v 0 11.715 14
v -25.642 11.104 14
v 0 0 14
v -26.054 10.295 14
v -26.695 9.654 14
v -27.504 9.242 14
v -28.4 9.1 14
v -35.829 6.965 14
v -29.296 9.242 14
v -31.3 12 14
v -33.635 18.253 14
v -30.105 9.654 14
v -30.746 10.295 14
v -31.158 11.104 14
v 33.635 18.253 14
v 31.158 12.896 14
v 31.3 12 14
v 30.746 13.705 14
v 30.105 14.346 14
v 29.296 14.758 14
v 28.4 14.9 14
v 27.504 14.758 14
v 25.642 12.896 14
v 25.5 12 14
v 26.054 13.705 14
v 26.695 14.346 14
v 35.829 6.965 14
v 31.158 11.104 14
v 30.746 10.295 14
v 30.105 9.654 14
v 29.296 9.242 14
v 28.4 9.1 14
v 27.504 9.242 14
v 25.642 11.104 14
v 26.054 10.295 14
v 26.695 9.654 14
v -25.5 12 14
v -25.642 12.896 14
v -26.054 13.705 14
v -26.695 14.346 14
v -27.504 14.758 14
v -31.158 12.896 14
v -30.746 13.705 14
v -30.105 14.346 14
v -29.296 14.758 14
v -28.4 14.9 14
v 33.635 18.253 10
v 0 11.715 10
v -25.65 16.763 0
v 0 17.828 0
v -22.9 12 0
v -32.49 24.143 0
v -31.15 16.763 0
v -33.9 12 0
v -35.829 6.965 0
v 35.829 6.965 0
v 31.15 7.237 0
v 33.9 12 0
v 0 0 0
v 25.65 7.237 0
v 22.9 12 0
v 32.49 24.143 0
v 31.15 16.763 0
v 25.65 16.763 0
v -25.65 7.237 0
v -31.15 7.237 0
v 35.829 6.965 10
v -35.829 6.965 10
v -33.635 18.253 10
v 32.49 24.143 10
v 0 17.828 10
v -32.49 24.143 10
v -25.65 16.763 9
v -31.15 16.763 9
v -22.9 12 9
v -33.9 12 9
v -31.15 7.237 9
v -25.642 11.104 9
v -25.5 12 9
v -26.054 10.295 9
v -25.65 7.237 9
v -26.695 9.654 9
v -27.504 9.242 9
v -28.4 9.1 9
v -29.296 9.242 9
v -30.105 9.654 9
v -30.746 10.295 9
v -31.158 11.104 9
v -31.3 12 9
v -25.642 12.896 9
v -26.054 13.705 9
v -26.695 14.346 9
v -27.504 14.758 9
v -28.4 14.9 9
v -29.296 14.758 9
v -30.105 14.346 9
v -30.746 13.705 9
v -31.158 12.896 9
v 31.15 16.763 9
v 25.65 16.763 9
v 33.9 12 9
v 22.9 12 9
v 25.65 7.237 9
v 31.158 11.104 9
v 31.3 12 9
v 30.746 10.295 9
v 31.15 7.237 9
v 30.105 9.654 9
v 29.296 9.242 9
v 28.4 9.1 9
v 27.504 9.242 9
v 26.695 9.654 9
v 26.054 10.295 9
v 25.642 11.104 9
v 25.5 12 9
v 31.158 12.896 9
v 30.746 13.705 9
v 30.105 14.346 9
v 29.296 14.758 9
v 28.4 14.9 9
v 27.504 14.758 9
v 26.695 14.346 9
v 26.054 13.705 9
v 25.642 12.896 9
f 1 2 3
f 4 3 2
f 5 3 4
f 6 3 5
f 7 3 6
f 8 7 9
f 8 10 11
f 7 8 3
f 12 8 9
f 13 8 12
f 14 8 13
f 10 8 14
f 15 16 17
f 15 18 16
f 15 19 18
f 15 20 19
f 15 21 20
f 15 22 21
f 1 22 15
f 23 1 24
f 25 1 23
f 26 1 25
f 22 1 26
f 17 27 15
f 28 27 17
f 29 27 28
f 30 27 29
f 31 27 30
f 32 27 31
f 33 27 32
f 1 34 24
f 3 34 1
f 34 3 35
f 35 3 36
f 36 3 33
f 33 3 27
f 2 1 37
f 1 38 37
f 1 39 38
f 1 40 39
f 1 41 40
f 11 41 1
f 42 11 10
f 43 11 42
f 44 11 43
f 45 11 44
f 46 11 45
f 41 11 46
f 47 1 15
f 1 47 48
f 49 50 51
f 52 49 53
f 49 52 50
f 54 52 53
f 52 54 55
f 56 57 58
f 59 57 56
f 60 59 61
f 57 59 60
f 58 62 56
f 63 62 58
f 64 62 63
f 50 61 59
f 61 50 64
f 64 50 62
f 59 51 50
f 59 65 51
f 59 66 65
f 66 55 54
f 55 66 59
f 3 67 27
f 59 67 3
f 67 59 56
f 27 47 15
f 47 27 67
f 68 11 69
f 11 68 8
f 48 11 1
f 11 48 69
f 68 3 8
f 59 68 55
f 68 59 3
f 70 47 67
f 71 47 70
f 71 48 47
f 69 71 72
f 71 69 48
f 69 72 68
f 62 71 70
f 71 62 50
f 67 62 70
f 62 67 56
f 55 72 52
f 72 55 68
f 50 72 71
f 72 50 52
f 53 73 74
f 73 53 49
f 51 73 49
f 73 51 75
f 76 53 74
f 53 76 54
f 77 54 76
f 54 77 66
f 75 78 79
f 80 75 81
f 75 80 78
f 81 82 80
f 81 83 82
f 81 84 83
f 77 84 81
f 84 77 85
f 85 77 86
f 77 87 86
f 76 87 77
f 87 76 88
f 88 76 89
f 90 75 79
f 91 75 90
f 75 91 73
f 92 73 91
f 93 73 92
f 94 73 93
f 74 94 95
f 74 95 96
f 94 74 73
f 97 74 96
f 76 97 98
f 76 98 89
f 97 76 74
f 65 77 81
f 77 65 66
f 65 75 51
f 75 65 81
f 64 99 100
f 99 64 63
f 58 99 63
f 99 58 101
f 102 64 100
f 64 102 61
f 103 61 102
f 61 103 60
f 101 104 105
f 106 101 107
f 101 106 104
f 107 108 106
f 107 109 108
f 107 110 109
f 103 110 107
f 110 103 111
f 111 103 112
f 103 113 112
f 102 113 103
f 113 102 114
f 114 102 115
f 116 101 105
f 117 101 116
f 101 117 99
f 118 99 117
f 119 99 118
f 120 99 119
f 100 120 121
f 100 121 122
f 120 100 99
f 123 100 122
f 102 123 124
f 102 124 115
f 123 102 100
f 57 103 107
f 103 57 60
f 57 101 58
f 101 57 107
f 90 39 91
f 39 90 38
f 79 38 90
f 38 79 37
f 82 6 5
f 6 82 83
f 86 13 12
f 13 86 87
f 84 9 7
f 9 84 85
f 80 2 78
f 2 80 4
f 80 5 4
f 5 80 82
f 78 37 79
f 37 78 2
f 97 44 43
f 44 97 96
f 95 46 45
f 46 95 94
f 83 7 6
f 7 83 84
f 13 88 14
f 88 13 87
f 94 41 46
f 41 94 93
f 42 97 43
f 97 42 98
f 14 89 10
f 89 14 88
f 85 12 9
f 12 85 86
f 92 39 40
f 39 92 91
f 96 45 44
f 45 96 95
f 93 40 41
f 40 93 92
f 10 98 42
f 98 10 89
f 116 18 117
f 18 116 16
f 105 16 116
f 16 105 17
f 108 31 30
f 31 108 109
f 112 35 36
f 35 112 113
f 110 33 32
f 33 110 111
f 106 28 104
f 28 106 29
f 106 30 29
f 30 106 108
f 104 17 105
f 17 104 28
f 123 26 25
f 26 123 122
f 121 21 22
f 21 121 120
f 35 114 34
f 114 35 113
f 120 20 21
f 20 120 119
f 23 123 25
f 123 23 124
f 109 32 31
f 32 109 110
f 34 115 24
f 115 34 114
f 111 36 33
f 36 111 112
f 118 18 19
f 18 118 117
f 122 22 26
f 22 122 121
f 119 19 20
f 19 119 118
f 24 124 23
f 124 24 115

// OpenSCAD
w=73/2;
h=11.5;
h2=17.5;
r=11;
d_offs = 56.8/2;

r1=11/2;
r2=5.8/2;

difference() {
union() {
rotate([0,0,r]) cube([w,h,14]);
rotate([0,0,-r]) translate([-w,0,0])cube([w,h,14]);
rotate([0,0,r]) cube([w,h2,10]);
rotate([0,0,-r]) translate([-w,0,0]) cube([w,h2,10]);
}
	translate([-d_offs,12,-1]) cylinder(10,r1,r1,$fn=6);
	translate([d_offs,12,-1]) cylinder(10,r1,r1,$fn=6);
	translate([-d_offs,12,-1]) cylinder(20,r2,r2,$fn=20);
	translate([d_offs,12,-1]) cylinder(20,r2,r2,$fn=20
);

	
}
